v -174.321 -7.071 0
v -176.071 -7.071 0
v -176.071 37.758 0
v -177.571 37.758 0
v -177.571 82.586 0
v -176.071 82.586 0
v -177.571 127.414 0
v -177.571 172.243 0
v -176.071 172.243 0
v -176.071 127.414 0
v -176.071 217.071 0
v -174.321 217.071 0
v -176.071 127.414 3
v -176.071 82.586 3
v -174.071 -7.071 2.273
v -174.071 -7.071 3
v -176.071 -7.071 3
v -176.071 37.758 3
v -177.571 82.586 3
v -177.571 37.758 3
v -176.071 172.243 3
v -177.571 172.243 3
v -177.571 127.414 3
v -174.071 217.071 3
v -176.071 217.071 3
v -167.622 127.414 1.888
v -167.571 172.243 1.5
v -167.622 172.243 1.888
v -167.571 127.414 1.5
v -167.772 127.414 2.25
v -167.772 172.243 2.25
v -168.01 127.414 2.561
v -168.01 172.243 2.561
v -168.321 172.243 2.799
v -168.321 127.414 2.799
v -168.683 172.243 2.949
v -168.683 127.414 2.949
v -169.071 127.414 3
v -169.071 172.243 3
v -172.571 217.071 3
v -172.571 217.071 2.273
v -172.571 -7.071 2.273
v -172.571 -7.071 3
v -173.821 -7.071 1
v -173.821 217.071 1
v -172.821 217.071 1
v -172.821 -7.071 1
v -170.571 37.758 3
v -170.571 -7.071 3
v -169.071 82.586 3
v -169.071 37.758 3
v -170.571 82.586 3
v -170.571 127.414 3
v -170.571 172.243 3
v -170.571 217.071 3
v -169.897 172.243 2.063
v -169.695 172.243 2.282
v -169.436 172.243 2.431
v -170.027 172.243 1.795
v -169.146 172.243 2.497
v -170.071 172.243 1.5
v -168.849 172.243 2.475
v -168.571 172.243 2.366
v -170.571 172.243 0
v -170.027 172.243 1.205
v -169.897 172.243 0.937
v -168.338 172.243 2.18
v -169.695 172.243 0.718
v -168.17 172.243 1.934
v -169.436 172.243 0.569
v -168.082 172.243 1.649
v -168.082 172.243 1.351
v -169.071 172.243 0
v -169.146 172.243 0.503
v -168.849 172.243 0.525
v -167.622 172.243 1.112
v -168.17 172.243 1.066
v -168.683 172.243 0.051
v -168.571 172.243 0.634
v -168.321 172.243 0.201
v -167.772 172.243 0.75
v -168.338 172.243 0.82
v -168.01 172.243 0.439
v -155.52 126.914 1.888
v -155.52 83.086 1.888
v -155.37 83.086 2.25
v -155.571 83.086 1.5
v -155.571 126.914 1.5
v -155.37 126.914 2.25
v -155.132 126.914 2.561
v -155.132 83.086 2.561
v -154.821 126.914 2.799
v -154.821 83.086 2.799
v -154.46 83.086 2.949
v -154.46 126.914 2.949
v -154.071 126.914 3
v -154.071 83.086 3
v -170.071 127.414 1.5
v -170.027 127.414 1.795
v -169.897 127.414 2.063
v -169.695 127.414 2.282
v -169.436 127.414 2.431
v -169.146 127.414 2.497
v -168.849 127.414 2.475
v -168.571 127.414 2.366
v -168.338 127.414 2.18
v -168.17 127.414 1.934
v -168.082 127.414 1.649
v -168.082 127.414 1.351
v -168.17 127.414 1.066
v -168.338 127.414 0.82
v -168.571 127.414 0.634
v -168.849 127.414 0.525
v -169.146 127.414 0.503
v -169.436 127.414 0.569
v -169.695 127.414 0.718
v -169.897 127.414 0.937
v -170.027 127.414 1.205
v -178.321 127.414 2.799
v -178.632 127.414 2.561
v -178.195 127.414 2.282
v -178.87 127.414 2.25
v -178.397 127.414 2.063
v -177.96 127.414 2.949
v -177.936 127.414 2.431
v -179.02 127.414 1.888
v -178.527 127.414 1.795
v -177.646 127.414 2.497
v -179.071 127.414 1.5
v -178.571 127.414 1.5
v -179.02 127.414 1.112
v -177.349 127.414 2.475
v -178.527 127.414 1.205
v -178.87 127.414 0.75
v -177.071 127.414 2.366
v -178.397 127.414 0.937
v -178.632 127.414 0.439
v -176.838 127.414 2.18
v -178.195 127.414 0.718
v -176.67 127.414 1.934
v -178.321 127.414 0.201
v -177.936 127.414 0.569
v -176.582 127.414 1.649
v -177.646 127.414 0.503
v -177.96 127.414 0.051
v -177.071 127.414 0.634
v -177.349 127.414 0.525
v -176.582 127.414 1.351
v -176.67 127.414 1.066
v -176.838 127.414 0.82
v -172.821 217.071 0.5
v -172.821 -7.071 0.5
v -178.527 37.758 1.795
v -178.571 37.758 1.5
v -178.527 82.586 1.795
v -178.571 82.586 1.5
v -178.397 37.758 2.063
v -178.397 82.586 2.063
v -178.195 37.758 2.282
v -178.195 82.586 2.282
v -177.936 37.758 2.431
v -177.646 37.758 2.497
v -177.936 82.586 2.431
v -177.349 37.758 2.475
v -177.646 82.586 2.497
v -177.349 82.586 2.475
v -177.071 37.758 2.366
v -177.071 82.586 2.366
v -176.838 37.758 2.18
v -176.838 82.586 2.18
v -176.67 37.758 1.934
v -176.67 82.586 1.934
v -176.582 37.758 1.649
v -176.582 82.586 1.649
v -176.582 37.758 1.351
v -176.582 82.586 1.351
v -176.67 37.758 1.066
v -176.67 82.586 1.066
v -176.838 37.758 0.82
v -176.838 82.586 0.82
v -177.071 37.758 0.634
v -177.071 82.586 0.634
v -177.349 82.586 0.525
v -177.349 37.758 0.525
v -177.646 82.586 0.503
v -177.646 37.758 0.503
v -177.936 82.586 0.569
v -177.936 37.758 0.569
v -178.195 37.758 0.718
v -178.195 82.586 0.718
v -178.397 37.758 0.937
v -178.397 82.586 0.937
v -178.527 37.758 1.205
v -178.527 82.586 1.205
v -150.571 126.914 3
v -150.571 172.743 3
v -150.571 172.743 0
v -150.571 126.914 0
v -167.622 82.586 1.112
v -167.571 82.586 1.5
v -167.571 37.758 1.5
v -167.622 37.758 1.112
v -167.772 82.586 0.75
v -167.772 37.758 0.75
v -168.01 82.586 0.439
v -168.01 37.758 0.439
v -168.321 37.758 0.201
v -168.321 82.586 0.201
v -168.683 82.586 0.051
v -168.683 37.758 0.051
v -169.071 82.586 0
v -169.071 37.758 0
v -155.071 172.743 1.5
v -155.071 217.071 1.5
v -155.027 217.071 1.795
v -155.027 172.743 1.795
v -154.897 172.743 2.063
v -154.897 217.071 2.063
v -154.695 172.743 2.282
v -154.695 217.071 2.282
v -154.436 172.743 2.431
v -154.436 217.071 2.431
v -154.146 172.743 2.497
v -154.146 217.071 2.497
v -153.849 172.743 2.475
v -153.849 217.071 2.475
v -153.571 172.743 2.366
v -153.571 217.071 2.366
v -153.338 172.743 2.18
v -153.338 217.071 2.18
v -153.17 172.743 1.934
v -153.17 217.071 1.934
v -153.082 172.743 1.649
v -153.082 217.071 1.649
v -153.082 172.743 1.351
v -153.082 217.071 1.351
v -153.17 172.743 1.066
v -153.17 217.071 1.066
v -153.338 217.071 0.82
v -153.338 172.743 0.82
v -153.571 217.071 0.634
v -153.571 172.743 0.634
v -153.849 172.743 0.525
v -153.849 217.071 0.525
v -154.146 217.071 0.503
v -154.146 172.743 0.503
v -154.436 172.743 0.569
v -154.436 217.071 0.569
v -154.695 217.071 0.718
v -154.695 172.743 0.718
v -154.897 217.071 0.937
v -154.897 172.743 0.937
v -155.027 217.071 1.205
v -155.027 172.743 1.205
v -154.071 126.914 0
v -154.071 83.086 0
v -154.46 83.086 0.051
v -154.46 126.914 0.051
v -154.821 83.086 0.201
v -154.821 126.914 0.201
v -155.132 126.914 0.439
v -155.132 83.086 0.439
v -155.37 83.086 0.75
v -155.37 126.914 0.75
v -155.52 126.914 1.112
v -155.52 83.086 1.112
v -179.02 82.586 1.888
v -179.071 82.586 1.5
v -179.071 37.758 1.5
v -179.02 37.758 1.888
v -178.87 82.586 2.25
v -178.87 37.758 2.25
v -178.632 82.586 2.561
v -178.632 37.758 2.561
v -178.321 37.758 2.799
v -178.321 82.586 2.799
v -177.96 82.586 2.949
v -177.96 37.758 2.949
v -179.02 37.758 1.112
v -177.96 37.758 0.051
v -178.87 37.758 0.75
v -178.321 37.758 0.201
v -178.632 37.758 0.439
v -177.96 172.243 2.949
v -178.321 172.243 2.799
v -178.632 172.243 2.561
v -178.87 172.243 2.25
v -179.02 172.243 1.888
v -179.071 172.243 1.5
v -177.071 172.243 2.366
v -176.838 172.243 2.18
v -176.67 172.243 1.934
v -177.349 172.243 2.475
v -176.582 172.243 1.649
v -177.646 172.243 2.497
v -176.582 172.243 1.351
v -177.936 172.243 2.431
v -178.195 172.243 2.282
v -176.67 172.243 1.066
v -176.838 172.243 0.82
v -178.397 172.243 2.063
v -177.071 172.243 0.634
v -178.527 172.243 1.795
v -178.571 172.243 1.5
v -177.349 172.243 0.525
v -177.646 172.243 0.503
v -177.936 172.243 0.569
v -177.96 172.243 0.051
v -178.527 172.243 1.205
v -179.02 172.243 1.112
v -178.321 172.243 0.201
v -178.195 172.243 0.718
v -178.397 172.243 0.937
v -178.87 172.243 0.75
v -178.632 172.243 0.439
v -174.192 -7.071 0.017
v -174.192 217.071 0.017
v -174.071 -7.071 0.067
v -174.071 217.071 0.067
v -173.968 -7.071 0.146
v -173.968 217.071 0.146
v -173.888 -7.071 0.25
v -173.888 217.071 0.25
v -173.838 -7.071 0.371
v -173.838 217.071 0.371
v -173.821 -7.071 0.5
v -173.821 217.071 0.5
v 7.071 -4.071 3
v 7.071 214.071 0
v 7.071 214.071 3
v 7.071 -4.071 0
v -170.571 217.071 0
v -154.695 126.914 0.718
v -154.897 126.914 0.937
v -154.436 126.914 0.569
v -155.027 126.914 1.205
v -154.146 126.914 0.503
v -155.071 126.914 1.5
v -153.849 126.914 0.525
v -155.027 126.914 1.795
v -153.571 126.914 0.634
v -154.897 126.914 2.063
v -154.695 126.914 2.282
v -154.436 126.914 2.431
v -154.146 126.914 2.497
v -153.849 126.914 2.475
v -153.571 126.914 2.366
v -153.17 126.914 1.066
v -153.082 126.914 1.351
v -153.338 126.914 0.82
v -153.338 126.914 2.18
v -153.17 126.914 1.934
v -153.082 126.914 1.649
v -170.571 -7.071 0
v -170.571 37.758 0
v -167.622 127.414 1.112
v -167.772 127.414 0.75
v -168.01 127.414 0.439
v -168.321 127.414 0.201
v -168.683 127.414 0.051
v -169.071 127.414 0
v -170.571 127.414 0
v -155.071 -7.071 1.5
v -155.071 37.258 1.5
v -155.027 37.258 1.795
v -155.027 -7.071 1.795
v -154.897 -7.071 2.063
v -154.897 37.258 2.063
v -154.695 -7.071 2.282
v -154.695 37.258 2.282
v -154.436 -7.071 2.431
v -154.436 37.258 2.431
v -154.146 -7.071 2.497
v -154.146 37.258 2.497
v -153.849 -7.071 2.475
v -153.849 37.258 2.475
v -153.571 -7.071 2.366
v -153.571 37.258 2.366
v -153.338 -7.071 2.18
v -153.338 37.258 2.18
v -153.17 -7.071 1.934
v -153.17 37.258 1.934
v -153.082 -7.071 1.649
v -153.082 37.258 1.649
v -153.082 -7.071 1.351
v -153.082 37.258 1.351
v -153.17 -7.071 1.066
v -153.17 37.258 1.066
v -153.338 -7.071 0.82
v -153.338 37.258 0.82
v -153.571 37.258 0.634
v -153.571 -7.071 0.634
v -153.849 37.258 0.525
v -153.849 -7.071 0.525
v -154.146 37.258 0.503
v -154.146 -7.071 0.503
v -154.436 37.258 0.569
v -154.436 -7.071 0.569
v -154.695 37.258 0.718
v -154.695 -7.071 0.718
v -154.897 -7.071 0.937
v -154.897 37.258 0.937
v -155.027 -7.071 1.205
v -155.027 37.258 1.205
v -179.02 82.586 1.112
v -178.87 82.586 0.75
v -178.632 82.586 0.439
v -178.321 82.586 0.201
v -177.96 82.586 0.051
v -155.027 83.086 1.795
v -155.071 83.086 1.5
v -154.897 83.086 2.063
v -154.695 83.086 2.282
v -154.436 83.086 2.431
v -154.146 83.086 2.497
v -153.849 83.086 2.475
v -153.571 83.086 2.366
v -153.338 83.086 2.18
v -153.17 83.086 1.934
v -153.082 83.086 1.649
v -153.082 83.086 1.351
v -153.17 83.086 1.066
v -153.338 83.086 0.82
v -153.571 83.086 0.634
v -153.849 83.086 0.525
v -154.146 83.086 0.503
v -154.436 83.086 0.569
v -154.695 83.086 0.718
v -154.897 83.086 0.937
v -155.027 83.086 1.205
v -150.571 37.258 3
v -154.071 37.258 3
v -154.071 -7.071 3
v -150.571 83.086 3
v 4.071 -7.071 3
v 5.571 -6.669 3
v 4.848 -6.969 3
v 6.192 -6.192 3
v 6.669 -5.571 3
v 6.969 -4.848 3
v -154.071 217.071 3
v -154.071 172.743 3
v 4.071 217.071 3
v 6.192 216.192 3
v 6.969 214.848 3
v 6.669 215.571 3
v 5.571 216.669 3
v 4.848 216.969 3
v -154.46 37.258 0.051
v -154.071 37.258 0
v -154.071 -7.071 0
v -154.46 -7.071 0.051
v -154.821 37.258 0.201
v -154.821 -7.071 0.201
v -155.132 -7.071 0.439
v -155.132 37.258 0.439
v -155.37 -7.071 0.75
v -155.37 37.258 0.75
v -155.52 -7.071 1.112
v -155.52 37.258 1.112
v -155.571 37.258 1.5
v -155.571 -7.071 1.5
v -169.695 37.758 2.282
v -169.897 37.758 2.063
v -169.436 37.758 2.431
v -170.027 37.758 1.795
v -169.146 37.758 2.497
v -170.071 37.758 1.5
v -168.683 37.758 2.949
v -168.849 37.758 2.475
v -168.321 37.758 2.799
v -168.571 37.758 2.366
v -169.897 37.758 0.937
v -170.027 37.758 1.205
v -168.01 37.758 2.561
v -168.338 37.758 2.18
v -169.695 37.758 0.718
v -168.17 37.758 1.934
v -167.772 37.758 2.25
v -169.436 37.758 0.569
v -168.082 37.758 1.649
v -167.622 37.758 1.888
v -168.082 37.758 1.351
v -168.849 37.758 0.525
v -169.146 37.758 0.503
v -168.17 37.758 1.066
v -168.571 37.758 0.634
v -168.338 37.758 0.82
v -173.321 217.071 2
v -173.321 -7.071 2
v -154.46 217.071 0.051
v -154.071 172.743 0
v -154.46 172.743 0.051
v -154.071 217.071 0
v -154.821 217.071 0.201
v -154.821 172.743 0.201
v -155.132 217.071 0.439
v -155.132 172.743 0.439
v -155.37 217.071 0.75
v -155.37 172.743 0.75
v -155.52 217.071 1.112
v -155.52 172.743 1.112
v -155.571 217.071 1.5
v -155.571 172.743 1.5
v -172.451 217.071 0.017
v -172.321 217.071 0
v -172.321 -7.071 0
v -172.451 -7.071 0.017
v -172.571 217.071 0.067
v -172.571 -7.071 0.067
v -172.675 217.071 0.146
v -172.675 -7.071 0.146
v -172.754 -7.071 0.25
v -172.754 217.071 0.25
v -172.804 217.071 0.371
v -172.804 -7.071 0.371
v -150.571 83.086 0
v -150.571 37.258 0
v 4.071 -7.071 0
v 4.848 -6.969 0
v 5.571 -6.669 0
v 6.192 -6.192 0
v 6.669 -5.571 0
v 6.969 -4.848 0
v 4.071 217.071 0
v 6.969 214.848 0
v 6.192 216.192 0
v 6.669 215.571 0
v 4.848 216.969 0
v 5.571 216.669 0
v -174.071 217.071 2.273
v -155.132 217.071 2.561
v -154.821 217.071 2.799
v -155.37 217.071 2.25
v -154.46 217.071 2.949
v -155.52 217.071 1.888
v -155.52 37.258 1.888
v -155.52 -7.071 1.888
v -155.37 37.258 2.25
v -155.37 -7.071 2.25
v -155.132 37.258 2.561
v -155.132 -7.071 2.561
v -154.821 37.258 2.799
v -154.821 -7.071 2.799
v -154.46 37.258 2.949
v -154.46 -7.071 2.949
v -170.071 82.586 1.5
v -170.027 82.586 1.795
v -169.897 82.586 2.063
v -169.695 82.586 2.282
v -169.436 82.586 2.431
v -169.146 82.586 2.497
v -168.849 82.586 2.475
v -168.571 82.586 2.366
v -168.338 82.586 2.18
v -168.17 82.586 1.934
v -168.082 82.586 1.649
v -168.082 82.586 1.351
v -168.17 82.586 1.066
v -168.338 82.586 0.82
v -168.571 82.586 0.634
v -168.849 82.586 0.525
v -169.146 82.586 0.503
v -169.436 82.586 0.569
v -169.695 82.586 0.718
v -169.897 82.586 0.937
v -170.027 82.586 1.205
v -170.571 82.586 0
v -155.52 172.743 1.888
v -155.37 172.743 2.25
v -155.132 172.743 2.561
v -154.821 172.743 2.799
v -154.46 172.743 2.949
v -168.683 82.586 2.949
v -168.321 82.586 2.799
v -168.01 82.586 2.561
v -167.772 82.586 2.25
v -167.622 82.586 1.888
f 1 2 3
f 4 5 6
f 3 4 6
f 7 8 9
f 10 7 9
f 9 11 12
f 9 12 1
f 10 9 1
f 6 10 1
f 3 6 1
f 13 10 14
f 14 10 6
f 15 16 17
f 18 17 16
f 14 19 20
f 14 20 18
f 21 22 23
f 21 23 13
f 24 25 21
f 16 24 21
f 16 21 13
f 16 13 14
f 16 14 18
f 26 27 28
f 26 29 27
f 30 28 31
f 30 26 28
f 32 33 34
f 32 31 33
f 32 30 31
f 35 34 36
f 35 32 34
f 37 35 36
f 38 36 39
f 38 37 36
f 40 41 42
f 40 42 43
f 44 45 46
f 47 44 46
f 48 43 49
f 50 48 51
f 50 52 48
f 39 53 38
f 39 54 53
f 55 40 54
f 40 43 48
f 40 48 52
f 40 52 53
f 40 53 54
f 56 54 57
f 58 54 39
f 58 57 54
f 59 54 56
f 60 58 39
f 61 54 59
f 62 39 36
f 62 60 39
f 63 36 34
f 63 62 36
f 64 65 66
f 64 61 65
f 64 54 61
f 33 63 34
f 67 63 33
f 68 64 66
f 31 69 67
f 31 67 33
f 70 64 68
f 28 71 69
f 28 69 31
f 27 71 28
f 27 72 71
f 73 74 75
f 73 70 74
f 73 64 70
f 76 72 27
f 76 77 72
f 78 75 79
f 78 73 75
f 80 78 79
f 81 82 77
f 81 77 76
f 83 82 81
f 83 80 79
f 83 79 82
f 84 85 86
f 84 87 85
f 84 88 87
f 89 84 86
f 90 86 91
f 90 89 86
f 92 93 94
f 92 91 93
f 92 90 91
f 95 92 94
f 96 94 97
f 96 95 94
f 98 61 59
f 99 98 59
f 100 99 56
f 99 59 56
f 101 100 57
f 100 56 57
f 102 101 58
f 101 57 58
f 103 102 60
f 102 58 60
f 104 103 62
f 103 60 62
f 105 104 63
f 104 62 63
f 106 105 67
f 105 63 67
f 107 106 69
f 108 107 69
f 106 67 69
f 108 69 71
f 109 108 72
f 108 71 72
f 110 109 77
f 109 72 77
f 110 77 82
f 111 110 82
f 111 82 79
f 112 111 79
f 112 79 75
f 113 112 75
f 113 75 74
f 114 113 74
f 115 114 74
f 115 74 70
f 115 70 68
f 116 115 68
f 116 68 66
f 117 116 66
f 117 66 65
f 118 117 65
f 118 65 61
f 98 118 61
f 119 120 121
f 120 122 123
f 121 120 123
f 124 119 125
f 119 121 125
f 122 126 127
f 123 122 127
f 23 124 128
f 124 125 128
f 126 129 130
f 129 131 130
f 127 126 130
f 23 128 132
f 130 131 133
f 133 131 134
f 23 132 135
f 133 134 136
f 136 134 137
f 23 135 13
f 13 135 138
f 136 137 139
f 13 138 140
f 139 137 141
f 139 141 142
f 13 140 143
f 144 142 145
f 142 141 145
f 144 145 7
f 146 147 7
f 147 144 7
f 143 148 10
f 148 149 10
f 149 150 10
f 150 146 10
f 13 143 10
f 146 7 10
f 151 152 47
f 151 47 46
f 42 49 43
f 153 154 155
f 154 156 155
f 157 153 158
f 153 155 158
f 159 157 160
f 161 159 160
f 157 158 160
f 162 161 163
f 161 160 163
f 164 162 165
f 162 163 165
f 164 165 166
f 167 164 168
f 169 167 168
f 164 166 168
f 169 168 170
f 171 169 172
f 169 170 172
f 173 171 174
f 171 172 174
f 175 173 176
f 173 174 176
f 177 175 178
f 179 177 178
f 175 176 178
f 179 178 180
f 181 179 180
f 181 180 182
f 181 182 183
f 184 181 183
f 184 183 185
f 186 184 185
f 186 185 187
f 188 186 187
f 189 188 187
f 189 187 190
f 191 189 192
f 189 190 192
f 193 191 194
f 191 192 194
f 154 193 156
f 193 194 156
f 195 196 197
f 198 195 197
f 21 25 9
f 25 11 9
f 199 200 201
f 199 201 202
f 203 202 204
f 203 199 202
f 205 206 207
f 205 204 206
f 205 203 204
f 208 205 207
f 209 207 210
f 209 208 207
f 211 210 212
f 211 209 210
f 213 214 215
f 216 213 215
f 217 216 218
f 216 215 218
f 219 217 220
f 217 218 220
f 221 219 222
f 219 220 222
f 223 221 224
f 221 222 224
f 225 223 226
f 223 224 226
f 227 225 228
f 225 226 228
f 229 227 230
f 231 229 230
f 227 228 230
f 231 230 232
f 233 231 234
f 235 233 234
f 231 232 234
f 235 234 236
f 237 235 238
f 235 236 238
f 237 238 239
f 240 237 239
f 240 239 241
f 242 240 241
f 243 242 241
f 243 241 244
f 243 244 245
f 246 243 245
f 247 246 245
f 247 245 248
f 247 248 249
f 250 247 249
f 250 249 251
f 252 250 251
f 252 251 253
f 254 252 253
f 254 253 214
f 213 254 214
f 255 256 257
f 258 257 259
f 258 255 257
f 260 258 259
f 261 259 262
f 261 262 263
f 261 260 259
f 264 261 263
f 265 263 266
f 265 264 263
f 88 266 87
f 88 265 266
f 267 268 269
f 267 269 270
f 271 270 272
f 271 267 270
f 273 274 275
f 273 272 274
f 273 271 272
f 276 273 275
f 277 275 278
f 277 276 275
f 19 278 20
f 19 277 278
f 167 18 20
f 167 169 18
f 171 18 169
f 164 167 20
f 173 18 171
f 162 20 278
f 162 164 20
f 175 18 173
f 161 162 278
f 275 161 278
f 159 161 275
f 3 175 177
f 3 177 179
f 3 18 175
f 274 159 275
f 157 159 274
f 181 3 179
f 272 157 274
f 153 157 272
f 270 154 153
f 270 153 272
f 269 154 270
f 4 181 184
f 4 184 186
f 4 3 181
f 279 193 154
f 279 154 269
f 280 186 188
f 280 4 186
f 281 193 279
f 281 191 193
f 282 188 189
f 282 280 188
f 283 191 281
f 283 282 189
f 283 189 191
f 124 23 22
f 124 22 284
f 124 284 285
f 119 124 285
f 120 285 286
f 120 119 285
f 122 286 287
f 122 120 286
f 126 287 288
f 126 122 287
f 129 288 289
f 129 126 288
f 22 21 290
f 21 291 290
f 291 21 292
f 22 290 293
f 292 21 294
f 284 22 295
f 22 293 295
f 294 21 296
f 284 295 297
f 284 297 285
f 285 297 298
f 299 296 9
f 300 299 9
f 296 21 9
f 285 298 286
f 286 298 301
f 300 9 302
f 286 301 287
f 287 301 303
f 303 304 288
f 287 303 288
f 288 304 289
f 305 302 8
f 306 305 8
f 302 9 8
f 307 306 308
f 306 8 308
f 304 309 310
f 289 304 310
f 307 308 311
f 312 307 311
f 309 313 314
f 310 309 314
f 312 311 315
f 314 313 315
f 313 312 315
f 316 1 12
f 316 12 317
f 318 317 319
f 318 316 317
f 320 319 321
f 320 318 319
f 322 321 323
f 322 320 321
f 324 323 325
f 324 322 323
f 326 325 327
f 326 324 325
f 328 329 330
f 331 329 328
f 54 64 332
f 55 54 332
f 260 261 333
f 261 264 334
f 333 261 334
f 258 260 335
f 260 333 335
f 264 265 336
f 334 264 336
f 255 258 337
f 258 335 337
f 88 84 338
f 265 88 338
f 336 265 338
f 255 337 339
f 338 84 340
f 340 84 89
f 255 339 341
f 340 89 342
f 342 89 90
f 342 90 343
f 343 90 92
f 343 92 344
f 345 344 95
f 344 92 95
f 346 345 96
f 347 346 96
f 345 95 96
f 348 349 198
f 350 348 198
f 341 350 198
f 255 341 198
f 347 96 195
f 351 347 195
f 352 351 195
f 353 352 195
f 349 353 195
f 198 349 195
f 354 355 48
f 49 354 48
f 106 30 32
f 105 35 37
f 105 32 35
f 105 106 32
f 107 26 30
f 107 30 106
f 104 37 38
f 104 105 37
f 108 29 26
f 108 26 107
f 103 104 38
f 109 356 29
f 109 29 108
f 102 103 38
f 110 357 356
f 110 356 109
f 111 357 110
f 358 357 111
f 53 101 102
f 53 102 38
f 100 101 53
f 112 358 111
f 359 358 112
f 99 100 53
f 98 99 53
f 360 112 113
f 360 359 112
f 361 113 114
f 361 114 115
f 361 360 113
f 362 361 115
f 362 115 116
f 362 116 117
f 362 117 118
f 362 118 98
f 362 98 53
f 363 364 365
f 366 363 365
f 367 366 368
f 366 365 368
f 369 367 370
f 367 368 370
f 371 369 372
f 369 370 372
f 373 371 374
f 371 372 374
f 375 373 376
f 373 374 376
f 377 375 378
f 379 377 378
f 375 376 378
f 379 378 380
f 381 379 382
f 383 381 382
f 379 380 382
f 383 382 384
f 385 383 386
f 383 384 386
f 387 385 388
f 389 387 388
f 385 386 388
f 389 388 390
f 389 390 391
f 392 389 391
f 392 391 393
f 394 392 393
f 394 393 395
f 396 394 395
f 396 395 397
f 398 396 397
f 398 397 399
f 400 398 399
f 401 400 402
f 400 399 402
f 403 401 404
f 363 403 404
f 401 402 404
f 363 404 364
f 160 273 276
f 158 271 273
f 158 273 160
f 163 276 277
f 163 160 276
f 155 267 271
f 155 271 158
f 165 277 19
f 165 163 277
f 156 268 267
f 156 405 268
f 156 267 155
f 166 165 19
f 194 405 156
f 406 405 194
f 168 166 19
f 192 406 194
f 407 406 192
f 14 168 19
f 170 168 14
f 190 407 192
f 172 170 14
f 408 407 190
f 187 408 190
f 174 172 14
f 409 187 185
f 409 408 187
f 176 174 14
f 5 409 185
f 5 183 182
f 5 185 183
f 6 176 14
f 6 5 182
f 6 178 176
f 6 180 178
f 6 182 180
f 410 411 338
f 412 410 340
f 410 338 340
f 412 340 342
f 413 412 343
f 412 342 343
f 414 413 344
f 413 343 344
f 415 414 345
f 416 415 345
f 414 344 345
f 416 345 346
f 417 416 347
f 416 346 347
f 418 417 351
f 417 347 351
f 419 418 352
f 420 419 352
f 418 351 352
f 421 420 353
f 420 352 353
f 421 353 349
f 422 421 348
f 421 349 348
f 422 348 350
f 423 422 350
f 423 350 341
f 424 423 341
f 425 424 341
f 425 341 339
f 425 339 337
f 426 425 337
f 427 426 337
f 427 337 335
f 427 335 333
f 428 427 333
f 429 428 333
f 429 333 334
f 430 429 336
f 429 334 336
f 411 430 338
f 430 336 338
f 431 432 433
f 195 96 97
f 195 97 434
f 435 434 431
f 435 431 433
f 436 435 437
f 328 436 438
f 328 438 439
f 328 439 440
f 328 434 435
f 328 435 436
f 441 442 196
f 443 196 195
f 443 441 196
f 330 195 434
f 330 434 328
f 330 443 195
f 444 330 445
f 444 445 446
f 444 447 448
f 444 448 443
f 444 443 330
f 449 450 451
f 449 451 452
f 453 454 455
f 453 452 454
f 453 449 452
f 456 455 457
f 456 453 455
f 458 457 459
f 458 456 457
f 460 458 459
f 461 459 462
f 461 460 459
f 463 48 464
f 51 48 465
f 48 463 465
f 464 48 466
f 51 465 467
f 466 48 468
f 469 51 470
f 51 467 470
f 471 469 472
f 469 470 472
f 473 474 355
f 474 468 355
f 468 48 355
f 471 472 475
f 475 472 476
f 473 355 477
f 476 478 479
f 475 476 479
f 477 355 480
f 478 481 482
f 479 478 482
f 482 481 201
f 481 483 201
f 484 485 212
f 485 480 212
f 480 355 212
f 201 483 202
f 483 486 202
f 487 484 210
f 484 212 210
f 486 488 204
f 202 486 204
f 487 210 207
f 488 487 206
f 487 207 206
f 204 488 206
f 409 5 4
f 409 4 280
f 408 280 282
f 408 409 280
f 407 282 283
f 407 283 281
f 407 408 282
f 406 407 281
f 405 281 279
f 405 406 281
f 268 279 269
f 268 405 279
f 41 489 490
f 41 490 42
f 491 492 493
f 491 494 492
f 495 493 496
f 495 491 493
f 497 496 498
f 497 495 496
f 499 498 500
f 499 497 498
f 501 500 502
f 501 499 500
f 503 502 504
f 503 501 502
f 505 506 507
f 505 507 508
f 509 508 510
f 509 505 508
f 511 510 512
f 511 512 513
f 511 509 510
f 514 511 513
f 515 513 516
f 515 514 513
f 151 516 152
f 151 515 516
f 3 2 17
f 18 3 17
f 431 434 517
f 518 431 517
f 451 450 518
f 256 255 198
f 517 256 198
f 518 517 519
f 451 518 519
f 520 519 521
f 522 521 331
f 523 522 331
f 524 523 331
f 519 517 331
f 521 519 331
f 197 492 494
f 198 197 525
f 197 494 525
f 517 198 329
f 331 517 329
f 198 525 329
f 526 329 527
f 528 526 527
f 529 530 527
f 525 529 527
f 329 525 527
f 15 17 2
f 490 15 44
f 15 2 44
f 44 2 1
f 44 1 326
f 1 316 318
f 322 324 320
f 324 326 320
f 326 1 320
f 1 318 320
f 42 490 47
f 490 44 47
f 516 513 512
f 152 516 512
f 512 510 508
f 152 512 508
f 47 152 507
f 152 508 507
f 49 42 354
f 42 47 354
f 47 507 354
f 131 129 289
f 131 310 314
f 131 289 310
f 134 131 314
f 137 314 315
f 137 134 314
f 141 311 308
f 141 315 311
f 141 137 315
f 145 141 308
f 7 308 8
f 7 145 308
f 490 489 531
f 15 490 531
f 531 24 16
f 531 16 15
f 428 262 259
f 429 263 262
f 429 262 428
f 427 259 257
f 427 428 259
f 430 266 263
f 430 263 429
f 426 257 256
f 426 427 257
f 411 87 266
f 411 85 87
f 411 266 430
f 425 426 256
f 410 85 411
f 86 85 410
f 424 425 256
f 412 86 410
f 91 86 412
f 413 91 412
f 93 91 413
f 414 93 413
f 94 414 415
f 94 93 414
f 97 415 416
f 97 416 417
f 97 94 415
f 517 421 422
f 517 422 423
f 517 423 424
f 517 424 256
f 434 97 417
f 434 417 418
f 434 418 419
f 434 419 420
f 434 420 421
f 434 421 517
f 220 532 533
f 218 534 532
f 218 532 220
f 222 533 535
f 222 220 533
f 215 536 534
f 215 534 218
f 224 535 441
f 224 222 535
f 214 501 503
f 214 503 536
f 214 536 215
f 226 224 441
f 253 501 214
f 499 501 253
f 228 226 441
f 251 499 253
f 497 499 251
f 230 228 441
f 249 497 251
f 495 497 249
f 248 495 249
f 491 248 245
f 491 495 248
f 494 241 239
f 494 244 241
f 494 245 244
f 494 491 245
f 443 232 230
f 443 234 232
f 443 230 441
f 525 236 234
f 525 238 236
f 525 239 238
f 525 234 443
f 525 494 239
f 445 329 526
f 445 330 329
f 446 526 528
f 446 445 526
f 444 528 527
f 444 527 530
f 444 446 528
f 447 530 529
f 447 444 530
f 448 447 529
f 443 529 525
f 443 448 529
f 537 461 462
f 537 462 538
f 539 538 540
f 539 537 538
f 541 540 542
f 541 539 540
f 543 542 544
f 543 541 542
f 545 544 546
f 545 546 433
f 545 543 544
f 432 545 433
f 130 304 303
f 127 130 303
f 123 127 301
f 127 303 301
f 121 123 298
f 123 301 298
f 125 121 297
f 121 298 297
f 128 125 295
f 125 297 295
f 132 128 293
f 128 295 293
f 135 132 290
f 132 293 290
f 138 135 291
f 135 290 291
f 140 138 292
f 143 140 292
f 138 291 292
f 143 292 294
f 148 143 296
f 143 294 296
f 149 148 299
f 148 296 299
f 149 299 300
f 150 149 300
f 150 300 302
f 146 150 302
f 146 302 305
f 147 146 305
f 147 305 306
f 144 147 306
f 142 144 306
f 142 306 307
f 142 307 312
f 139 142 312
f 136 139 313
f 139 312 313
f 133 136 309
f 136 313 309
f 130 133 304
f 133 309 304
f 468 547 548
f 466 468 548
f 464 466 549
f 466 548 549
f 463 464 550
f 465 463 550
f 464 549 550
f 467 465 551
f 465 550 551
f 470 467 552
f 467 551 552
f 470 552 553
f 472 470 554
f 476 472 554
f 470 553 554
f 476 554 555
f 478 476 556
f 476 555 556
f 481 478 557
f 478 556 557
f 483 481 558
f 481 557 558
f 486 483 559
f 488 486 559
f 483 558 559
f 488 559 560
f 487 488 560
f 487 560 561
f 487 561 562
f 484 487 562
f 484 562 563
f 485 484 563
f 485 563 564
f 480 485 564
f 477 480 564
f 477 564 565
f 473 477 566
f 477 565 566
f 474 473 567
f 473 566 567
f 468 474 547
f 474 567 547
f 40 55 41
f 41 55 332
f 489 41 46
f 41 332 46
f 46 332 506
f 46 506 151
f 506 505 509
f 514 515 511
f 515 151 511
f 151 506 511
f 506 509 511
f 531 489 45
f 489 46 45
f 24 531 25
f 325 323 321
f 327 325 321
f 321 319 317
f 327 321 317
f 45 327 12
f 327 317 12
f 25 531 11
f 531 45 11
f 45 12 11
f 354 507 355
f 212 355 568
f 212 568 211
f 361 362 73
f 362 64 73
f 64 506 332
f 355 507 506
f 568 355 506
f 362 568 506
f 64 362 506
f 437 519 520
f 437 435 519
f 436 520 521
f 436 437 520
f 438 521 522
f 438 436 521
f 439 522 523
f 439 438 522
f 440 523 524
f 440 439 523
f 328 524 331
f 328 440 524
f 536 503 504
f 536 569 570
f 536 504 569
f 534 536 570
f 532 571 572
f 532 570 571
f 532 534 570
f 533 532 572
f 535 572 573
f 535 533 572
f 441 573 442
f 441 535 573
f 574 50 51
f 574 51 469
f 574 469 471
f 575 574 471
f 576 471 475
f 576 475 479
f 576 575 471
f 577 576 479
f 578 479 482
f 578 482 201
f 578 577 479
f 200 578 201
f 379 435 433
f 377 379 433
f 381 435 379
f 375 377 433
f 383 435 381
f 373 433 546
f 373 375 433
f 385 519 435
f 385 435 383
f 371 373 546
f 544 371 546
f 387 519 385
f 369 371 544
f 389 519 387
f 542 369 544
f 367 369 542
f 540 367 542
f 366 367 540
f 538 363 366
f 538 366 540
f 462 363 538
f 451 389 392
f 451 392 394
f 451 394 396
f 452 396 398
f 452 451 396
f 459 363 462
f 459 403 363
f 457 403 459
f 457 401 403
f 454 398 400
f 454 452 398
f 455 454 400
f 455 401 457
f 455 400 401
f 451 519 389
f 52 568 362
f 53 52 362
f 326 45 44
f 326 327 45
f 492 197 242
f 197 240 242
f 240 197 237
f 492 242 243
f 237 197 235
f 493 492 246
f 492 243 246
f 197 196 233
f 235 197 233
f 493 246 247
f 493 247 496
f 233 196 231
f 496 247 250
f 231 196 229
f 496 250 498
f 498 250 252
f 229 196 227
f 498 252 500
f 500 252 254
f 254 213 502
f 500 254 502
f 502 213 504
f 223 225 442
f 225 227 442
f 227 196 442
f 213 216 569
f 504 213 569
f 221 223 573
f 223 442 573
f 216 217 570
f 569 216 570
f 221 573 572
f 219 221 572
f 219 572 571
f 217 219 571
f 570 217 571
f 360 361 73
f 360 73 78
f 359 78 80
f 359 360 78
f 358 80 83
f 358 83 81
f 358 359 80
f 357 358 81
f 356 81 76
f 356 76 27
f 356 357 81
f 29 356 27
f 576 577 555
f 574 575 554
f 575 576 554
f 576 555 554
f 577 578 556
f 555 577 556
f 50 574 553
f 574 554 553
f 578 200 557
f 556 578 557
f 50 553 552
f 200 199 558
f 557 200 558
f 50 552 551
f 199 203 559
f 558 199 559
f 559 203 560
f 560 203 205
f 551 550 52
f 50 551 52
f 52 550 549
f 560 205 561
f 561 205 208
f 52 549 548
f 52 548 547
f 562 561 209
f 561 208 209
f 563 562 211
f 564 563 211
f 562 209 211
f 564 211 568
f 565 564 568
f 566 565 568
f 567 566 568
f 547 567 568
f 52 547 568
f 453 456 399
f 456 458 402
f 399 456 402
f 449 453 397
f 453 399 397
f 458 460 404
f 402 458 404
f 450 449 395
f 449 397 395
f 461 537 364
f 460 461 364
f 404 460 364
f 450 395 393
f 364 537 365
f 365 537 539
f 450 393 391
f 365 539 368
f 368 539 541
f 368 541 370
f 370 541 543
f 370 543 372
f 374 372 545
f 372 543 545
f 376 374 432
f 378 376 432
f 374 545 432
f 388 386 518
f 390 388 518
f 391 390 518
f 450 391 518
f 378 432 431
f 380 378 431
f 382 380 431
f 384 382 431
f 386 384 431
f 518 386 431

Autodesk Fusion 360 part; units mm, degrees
sketch "Sketch1" plane through (0, 0, 0) normal (0, 0, 1) x (1, 0, 0)
  line L0 (0, 0) -> (-148.5, 0)
  line L1 (-148.5, 0) -> (-148.5, 210)
  line L2 (-148.5, 210) -> (0, 210)
  line L3 (0, 210) -> (0, 0)
  line L4 (0, 0) -> (7.0711, -7.0711)
  line L5 (0, 0) -> (10, 0) construction
  line L6 (-148.5, 210) -> (-155.5711, 217.0711)
  line L7 (-148.5, 210) -> (-138.5, 210) construction
  line L8 (-155.5711, 217.0711) -> (7.0711, 217.0711)
  line L9 (7.0711, 217.0711) -> (7.0711, -7.0711)
  line L10 (7.0711, -7.0711) -> (-155.5711, -7.0711)
  line L11 (-155.5711, -7.0711) -> (-155.5711, 217.0711)
  dimension "d1" = 148.5
  dimension "d2" = 210
  dimension "d3" = 10
  dimension "d4" = 45
  dimension "d5" = 135
  dimension "d6" = 10
extrude "Extrude1" add sketch "Sketch1" along normal blind 3 makes body 1
sketch "Sketch2" plane through (0, 0, 3) normal (0, 0, 1) x (-1, 0, 0)
  line L0 (155.5711, 7.0711) -> (-7.0711, 7.0711)
  line L1 (-7.0711, 7.0711) -> (-7.0711, -217.0711)
  line L2 (-7.0711, -217.0711) -> (155.5711, -217.0711)
  line L3 (155.5711, -217.0711) -> (155.5711, 7.0711)
  line L4 (155.5711, 7.0711) -> (145.5711, 7.0711)
  line L5 (145.5711, 7.0711) -> (145.5711, -217.0709)
  line L6 (145.5711, -217.0709) -> (155.5711, -217.0709)
  line L7 (155.5711, -217.0709) -> (155.5711, 7.0711)
  line L8 (155.5711, -217.0711) -> (150.5711, -217.0711)
  line L9 (150.5711, -217.0711) -> (150.5711, -172.2427)
  line L10 (150.5711, -172.2427) -> (155.5711, -172.2427)
  line L11 (155.5711, -172.2427) -> (155.5711, -217.0711)
  line L12 (150.5711, -172.2427) -> (155.5711, -172.2427)
  line L13 (155.5711, -172.2427) -> (155.5711, -127.4143)
  line L14 (155.5711, -127.4143) -> (150.5711, -127.4143)
  line L15 (150.5711, -127.4143) -> (150.5711, -172.2427)
  line L16 (150.5711, -127.4143) -> (155.5711, -127.4143)
  line L17 (155.5711, -127.4143) -> (155.5711, -82.5859)
  line L18 (155.5711, -82.5859) -> (150.5711, -82.5859)
  line L19 (150.5711, -82.5859) -> (150.5711, -127.4143)
  line L20 (150.5711, -82.5859) -> (155.5711, -82.5859)
  line L21 (155.5711, -82.5859) -> (155.5711, -37.7575)
  line L22 (155.5711, -37.7575) -> (150.5711, -37.7575)
  line L23 (150.5711, -37.7575) -> (150.5711, -82.5859)
  line L24 (150.5711, -37.7575) -> (155.5711, -37.7575)
  line L25 (155.5711, -37.7575) -> (155.5711, 7.0711)
  line L26 (155.5711, 7.0711) -> (150.5711, 7.0711)
  line L27 (150.5711, 7.0711) -> (150.5711, -37.7575)
  dimension "d9" = 10
  dimension "d10" = 224.142
  dimension "d11" = 44.8284
  dimension "d12" = 44.8284
  dimension "d13" = 44.8284
  dimension "d14" = 44.8284
extrude "Extrude2" cut sketch "Sketch2" against normal blind 160 contours L3 L7 L18 L20 L21 L22 L23 L24 | L3 L7 L10 L12 L13 L14 L15 L16 bodies 1
sketch "Sketch3" plane through (0, 0, 0) normal (0, 0, 1) x (1, 0, 0)
  line L0 (-170.5711, 217.0711) -> (-176.0711, 217.0711)
  line L1 (-176.0711, 217.0711) -> (-176.0711, -9.7901)
  line L2 (-176.0711, -9.7901) -> (-170.5711, -9.7901)
  line L3 (-170.5711, -9.7901) -> (-170.5711, 217.0711)
  line L4 (-170.5711, 217.0711) -> (-170.5711, 172.2427)
  line L5 (-170.5711, 127.4143) -> (-170.5711, 82.5859)
  line L6 (-170.5711, 82.5859) -> (-170.5711, 37.7575)
  line L7 (-170.5711, 37.7575) -> (-167.5711, 37.7575)
  line L8 (-167.5711, 37.7575) -> (-167.5711, 82.5859)
  line L9 (-167.5711, 82.5859) -> (-170.5711, 82.5859)
  line L10 (-170.5711, 82.5859) -> (-170.5711, 37.7575)
  line L11 (-176.0711, 172.2427) -> (-179.0711, 172.2427)
  line L12 (-179.0711, 172.2427) -> (-179.0711, 127.4143)
  line L13 (-179.0711, 127.4143) -> (-176.0711, 127.4143)
  line L14 (-176.0711, 127.4143) -> (-176.0711, 172.2427)
  line L15 (-170.5711, 82.5859) -> (-176.0711, 82.5859)
  line L16 (-176.0711, 82.5859) -> (-176.0711, 37.7575)
  line L17 (-176.0711, 37.7575) -> (-170.5711, 37.7575)
  line L18 (-170.5711, 37.7575) -> (-170.5711, 82.5859)
  line L19 (-176.0711, 37.7575) -> (-179.0711, 37.7575)
  line L20 (-179.0711, 37.7575) -> (-179.0711, 82.5859)
  line L21 (-179.0711, 82.5859) -> (-176.0711, 82.5859)
  line L22 (-176.0711, 82.5859) -> (-176.0711, 37.7575)
  line L23 (-170.5711, 172.2427) -> (-167.5711, 172.2427)
  line L24 (-167.5711, 172.2427) -> (-167.5711, 127.4143)
  line L25 (-167.5711, 127.4143) -> (-170.5711, 127.4143)
  line L26 (-170.5711, 127.4143) -> (-170.5711, 172.2427)
  point P0 (-155.5711, 217.0711)
  point P1 (-155.5711, -7.0711)
  dimension "d17" = 15
  dimension "d19" = 5.5
  dimension "d20" = 44.8284
  dimension "d21" = 44.8284
  dimension "d22" = 44.8284
  dimension "d23" = 44.8284
  dimension "d24" = 3
  dimension "d25" = 44.8284
  dimension "d27" = 3
  dimension "d28" = 44.8284
  dimension "d29" = 3
  dimension "d30" = 3
  dimension "d31" = 44.8284
extrude "Extrude3" add sketch "Sketch3" along normal blind 3 separate body makes body 2
fillet "Fillet1" radius 1.5 8 edges at (-179.0711, 60.1717, 0) (-179.0711, 60.1717, 3) (-179.0711, 149.8285, 0) (-179.0711, 149.8285, 3) (-167.5711, 60.1717, 0) (-167.5711, 60.1717, 3) (-167.5711, 149.8285, 0) (-167.5711, 149.8285, 3) on bodies 2
fillet "Fillet2" radius 1.5 6 edges at (-155.5711, 194.6569, 3) (-155.5711, 194.6569, 0) (-155.5711, 105.0001, 0) (-155.5711, 105.0001, 3) (-155.5711, 15.3432, 3) (-155.5711, 15.3432, 0) on bodies 1
sketch "Sketch4" plane through (0, 217.0711, 0) normal (0, 1, 0) x (-1, 0, 0)
  line L0 (170.5711, 0) -> (176.0711, 0)
  line L1 (176.0711, 0) -> (176.0711, 3)
  line L2 (176.0711, 3) -> (170.5711, 3)
  line L3 (170.5711, 3) -> (170.5711, 0)
  line L4 (170.5711, 3) -> (176.0711, 3)
  line L5 (173.3211, 3) -> (173.3211, 2)
  line L6 (173.3211, 2) -> (170.5711, 3)
  line L7 (173.3211, 2) -> (176.0711, 3)
extrude "Extrude4" cut sketch "Sketch4" against normal blind 240 contours L2 L4 L5 L6 | L2 L4 L5 L7 bodies 2
sketch "Sketch5" plane through (0, 0, 0) normal (0, 0, -1) x (1, 0, 0)
  line L0 (-169.0711, -172.2427) -> (-169.0711, -127.4143)
  line L1 (-169.0711, -127.4143) -> (-170.5711, -127.4143)
  line L2 (-170.5711, -127.4143) -> (-170.5711, -82.5859)
  line L3 (-170.5711, -82.5859) -> (-169.0711, -82.5859)
  line L4 (-169.0711, -82.5859) -> (-169.0711, -37.7575)
  line L5 (-169.0711, -37.7575) -> (-170.5711, -37.7575)
  line L6 (-170.5711, -37.7575) -> (-170.5711, 9.7901)
  line L7 (-170.5711, 9.7901) -> (-176.0711, 9.7901)
  line L8 (-176.0711, 9.7901) -> (-176.0711, -37.7575)
  line L9 (-176.0711, -37.7575) -> (-177.5711, -37.7575)
  line L10 (-177.5711, -37.7575) -> (-177.5711, -82.5859)
  line L11 (-177.5711, -82.5859) -> (-176.0711, -82.5859)
  line L12 (-176.0711, -82.5859) -> (-176.0711, -127.4143)
  line L13 (-176.0711, -127.4143) -> (-177.5711, -127.4143)
  line L14 (-177.5711, -127.4143) -> (-177.5711, -172.2427)
  line L15 (-177.5711, -172.2427) -> (-176.0711, -172.2427)
  line L16 (-176.0711, -172.2427) -> (-176.0711, -217.0711)
  line L17 (-176.0711, -217.0711) -> (-170.5711, -217.0711)
  line L18 (-170.5711, -217.0711) -> (-170.5711, -172.2427)
  line L19 (-170.5711, -172.2427) -> (-169.0711, -172.2427)
  line L20 (-170.5711, 9.7901) -> (-176.0711, 9.7901)
  line L21 (-176.0711, 9.7901) -> (-176.0711, -217.0711)
  line L22 (-176.0711, -217.0711) -> (-170.5711, -217.0711)
  line L23 (-170.5711, -217.0711) -> (-170.5711, 9.7901)
  line L24 (-170.5711, 9.7901) -> (-173.3211, 9.7901)
  line L25 (-173.3211, 9.7901) -> (-171.9461, 9.7901)
  line L26 (-176.0711, 9.7901) -> (-173.3211, 9.7901)
  line L27 (-174.6961, 9.7901) -> (-173.3211, 9.7901)
  line L28 (-171.9461, 9.7901) -> (-173.3211, 9.7901)
  line L29 (-171.9461, 9.7901) -> (-171.9461, -217.0711)
  line L30 (-171.9461, -217.0711) -> (-174.6961, -217.0711)
  line L31 (-174.6961, -217.0711) -> (-174.6961, 9.7901)
  line L32 (-174.6961, 9.7901) -> (-171.9461, 9.7901)
  line L33 (-171.9461, 9.7901) -> (-171.9461, -217.0711)
extrude "Extrude9" cut 1 faces at (-173.3211, -9.7901, 0.6667) along direction (0, 1, 0) blind 3 on bodies 2 bodies 2
extrude "Extrude10" add 1 faces at (-173.3211, -6.7901, 0.6667) along direction (0, -1, 0) up to surface (0.281 mm away) on bodies 2 bodies 2
extrude "Extrude11" cut 1 faces at (-152.9046, 172.2427, 1) along direction (0, 1, 0) blind 0.5 on bodies 1 bodies 1
extrude "Extrude12" cut 1 faces at (-152.9046, 127.4143, 2) along direction (0, -1, 0) blind 0.5 on bodies 1 bodies 1
extrude "Extrude13" cut 1 faces at (-152.9046, 37.7575, 2) along direction (0, -1, 0) blind 0.5 on bodies 1 bodies 1
extrude "Extrude14" cut 1 faces at (-152.9046, 82.5859, 2) along direction (0, 1, 0) blind 0.5 on bodies 1 bodies 1
sketch "Sketch9" plane through (0, 217.0711, 0) normal (0, 1, 0) x (-1, 0, 0)
  line L0 (176.0711, 3) -> (173.3211, 2)
  line L1 (173.3211, 2) -> (170.5711, 3)
  line L2 (170.5711, 3) -> (170.5711, 0)
  line L3 (170.5711, 0) -> (176.0711, 0)
  line L4 (176.0711, 0) -> (176.0711, 3)
  line L5 (170.5711, 0) -> (172.5711, 0)
  line L6 (172.5711, 0) -> (172.5711, 3)
  line L7 (172.5711, 3) -> (170.5711, 3)
  line L8 (170.5711, 3) -> (170.5711, 0)
  line L9 (176.0711, 3) -> (174.0711, 3)
  line L10 (174.0711, 3) -> (174.0711, 0)
  line L11 (174.0711, 0) -> (176.0711, 0)
  line L12 (176.0711, 0) -> (176.0711, 3)
  dimension "d76" = 2
  dimension "d77" = 2
extrude "Extrude15" add sketch "Sketch9" against normal up to surface (224.1421 mm away) contours L0 L9 L10 | L1 L6 L7 bodies 2
sketch "Sketch10" plane through (0, 217.0711, 0) normal (0, 1, 0) x (-1, 0, 0)
  arc A0 (154.0711, 0) -> (154.0711, 3) centre (154.0711, 1.5) ccw
  line L0 (154.0711, 3) -> (-7.0711, 3)
  line L1 (-7.0711, 3) -> (-7.0711, 0)
  line L2 (-7.0711, 0) -> (154.0711, 0)
  circle A1 centre (154.0711, 1.5) radius 1
  dimension "d80" = 2
extrude "Extrude16" cut sketch "Sketch10" against normal blind 240 contours A1 bodies 1
sketch "Sketch11" plane through (0, 172.2427, 0) normal (0, 1, 0) x (-1, 0, 0)
  arc A0 (169.0711, 3) -> (169.0711, 0) centre (169.0711, 1.5) ccw
  line L0 (169.0711, 0) -> (170.5711, 0)
  line L1 (170.5711, 0) -> (170.5711, 3)
  line L2 (170.5711, 3) -> (169.0711, 3)
  circle A1 centre (169.0711, 1.5) radius 1
  dimension "d83" = 2
extrude "Extrude17" cut sketch "Sketch11" against normal blind 170 contours A1 bodies 2
sketch "Sketch12" plane through (0, 172.2427, 0) normal (0, 1, 0) x (-1, 0, 0)
  arc A0 (177.5711, 0) -> (177.5711, 3) centre (177.5711, 1.5) ccw
  line L0 (177.5711, 3) -> (176.0711, 3)
  line L1 (176.0711, 3) -> (176.0711, 0)
  line L2 (176.0711, 0) -> (177.5711, 0)
  circle A1 centre (177.5711, 1.5) radius 1
  dimension "d86" = 2
extrude "Extrude18" cut sketch "Sketch12" against normal blind 160 contours A1 bodies 2
fillet "Fillet6" radius 3 2 edges at (7.0711, 217.0711, 1.5) (7.0711, -7.0711, 1.5) on bodies 1
sketch "Sketch13" plane through (0, 0, 0) normal (0, 0, -1) x (1, 0, 0)
  line L0 (-176.0711, 7.0711) -> (-176.0711, -37.7575)
  line L1 (-176.0711, -37.7575) -> (-177.5711, -37.7575)
  line L2 (-177.5711, -37.7575) -> (-177.5711, -82.5859)
  line L3 (-177.5711, -82.5859) -> (-176.0711, -82.5859)
  line L4 (-176.0711, -82.5859) -> (-176.0711, -127.4143)
  line L5 (-176.0711, -127.4143) -> (-177.5711, -127.4143)
  line L6 (-177.5711, -127.4143) -> (-177.5711, -172.2427)
  line L7 (-177.5711, -172.2427) -> (-176.0711, -172.2427)
  line L8 (-176.0711, -172.2427) -> (-176.0711, -217.0711)
  line L9 (-176.0711, -217.0711) -> (-170.5711, -217.0711)
  line L10 (-170.5711, -217.0711) -> (-170.5711, -172.2427)
  line L11 (-170.5711, -172.2427) -> (-169.0711, -172.2427)
  line L12 (-169.0711, -172.2427) -> (-169.0711, -127.4143)
  line L13 (-169.0711, -127.4143) -> (-170.5711, -127.4143)
  line L14 (-170.5711, -127.4143) -> (-170.5711, -82.5859)
  line L15 (-170.5711, -82.5859) -> (-169.0711, -82.5859)
  line L16 (-169.0711, -82.5859) -> (-169.0711, -37.7575)
  line L17 (-169.0711, -37.7575) -> (-170.5711, -37.7575)
  line L18 (-170.5711, -37.7575) -> (-170.5711, 7.0711)
  line L19 (-170.5711, 7.0711) -> (-176.0711, 7.0711)
  line L20 (-173.3211, 7.0711) -> (-173.8211, 7.0711)
  line L21 (-173.3211, -217.0711) -> (-172.8211, -217.0711)
  line L22 (-172.8211, -217.0711) -> (-173.8211, -217.0711)
  line L23 (-173.8211, -217.0711) -> (-173.8211, 7.0711)
  line L24 (-173.8211, 7.0711) -> (-172.8211, 7.0711)
  line L25 (-172.8211, 7.0711) -> (-172.8211, -217.0711)
  dimension "d40" = -1
  dimension "d91" = 0.5
  dimension "d92" = 0.5
extrude "Extrude19" cut sketch "Sketch13" against normal blind 1 contours L9 L19 L20 L21 L22 L23 L24 L25 bodies 2
fillet "Fillet7" radius 0.5 2 edges at (-173.8211, 105, 0) (-172.8211, 105, 0) on bodies 2
